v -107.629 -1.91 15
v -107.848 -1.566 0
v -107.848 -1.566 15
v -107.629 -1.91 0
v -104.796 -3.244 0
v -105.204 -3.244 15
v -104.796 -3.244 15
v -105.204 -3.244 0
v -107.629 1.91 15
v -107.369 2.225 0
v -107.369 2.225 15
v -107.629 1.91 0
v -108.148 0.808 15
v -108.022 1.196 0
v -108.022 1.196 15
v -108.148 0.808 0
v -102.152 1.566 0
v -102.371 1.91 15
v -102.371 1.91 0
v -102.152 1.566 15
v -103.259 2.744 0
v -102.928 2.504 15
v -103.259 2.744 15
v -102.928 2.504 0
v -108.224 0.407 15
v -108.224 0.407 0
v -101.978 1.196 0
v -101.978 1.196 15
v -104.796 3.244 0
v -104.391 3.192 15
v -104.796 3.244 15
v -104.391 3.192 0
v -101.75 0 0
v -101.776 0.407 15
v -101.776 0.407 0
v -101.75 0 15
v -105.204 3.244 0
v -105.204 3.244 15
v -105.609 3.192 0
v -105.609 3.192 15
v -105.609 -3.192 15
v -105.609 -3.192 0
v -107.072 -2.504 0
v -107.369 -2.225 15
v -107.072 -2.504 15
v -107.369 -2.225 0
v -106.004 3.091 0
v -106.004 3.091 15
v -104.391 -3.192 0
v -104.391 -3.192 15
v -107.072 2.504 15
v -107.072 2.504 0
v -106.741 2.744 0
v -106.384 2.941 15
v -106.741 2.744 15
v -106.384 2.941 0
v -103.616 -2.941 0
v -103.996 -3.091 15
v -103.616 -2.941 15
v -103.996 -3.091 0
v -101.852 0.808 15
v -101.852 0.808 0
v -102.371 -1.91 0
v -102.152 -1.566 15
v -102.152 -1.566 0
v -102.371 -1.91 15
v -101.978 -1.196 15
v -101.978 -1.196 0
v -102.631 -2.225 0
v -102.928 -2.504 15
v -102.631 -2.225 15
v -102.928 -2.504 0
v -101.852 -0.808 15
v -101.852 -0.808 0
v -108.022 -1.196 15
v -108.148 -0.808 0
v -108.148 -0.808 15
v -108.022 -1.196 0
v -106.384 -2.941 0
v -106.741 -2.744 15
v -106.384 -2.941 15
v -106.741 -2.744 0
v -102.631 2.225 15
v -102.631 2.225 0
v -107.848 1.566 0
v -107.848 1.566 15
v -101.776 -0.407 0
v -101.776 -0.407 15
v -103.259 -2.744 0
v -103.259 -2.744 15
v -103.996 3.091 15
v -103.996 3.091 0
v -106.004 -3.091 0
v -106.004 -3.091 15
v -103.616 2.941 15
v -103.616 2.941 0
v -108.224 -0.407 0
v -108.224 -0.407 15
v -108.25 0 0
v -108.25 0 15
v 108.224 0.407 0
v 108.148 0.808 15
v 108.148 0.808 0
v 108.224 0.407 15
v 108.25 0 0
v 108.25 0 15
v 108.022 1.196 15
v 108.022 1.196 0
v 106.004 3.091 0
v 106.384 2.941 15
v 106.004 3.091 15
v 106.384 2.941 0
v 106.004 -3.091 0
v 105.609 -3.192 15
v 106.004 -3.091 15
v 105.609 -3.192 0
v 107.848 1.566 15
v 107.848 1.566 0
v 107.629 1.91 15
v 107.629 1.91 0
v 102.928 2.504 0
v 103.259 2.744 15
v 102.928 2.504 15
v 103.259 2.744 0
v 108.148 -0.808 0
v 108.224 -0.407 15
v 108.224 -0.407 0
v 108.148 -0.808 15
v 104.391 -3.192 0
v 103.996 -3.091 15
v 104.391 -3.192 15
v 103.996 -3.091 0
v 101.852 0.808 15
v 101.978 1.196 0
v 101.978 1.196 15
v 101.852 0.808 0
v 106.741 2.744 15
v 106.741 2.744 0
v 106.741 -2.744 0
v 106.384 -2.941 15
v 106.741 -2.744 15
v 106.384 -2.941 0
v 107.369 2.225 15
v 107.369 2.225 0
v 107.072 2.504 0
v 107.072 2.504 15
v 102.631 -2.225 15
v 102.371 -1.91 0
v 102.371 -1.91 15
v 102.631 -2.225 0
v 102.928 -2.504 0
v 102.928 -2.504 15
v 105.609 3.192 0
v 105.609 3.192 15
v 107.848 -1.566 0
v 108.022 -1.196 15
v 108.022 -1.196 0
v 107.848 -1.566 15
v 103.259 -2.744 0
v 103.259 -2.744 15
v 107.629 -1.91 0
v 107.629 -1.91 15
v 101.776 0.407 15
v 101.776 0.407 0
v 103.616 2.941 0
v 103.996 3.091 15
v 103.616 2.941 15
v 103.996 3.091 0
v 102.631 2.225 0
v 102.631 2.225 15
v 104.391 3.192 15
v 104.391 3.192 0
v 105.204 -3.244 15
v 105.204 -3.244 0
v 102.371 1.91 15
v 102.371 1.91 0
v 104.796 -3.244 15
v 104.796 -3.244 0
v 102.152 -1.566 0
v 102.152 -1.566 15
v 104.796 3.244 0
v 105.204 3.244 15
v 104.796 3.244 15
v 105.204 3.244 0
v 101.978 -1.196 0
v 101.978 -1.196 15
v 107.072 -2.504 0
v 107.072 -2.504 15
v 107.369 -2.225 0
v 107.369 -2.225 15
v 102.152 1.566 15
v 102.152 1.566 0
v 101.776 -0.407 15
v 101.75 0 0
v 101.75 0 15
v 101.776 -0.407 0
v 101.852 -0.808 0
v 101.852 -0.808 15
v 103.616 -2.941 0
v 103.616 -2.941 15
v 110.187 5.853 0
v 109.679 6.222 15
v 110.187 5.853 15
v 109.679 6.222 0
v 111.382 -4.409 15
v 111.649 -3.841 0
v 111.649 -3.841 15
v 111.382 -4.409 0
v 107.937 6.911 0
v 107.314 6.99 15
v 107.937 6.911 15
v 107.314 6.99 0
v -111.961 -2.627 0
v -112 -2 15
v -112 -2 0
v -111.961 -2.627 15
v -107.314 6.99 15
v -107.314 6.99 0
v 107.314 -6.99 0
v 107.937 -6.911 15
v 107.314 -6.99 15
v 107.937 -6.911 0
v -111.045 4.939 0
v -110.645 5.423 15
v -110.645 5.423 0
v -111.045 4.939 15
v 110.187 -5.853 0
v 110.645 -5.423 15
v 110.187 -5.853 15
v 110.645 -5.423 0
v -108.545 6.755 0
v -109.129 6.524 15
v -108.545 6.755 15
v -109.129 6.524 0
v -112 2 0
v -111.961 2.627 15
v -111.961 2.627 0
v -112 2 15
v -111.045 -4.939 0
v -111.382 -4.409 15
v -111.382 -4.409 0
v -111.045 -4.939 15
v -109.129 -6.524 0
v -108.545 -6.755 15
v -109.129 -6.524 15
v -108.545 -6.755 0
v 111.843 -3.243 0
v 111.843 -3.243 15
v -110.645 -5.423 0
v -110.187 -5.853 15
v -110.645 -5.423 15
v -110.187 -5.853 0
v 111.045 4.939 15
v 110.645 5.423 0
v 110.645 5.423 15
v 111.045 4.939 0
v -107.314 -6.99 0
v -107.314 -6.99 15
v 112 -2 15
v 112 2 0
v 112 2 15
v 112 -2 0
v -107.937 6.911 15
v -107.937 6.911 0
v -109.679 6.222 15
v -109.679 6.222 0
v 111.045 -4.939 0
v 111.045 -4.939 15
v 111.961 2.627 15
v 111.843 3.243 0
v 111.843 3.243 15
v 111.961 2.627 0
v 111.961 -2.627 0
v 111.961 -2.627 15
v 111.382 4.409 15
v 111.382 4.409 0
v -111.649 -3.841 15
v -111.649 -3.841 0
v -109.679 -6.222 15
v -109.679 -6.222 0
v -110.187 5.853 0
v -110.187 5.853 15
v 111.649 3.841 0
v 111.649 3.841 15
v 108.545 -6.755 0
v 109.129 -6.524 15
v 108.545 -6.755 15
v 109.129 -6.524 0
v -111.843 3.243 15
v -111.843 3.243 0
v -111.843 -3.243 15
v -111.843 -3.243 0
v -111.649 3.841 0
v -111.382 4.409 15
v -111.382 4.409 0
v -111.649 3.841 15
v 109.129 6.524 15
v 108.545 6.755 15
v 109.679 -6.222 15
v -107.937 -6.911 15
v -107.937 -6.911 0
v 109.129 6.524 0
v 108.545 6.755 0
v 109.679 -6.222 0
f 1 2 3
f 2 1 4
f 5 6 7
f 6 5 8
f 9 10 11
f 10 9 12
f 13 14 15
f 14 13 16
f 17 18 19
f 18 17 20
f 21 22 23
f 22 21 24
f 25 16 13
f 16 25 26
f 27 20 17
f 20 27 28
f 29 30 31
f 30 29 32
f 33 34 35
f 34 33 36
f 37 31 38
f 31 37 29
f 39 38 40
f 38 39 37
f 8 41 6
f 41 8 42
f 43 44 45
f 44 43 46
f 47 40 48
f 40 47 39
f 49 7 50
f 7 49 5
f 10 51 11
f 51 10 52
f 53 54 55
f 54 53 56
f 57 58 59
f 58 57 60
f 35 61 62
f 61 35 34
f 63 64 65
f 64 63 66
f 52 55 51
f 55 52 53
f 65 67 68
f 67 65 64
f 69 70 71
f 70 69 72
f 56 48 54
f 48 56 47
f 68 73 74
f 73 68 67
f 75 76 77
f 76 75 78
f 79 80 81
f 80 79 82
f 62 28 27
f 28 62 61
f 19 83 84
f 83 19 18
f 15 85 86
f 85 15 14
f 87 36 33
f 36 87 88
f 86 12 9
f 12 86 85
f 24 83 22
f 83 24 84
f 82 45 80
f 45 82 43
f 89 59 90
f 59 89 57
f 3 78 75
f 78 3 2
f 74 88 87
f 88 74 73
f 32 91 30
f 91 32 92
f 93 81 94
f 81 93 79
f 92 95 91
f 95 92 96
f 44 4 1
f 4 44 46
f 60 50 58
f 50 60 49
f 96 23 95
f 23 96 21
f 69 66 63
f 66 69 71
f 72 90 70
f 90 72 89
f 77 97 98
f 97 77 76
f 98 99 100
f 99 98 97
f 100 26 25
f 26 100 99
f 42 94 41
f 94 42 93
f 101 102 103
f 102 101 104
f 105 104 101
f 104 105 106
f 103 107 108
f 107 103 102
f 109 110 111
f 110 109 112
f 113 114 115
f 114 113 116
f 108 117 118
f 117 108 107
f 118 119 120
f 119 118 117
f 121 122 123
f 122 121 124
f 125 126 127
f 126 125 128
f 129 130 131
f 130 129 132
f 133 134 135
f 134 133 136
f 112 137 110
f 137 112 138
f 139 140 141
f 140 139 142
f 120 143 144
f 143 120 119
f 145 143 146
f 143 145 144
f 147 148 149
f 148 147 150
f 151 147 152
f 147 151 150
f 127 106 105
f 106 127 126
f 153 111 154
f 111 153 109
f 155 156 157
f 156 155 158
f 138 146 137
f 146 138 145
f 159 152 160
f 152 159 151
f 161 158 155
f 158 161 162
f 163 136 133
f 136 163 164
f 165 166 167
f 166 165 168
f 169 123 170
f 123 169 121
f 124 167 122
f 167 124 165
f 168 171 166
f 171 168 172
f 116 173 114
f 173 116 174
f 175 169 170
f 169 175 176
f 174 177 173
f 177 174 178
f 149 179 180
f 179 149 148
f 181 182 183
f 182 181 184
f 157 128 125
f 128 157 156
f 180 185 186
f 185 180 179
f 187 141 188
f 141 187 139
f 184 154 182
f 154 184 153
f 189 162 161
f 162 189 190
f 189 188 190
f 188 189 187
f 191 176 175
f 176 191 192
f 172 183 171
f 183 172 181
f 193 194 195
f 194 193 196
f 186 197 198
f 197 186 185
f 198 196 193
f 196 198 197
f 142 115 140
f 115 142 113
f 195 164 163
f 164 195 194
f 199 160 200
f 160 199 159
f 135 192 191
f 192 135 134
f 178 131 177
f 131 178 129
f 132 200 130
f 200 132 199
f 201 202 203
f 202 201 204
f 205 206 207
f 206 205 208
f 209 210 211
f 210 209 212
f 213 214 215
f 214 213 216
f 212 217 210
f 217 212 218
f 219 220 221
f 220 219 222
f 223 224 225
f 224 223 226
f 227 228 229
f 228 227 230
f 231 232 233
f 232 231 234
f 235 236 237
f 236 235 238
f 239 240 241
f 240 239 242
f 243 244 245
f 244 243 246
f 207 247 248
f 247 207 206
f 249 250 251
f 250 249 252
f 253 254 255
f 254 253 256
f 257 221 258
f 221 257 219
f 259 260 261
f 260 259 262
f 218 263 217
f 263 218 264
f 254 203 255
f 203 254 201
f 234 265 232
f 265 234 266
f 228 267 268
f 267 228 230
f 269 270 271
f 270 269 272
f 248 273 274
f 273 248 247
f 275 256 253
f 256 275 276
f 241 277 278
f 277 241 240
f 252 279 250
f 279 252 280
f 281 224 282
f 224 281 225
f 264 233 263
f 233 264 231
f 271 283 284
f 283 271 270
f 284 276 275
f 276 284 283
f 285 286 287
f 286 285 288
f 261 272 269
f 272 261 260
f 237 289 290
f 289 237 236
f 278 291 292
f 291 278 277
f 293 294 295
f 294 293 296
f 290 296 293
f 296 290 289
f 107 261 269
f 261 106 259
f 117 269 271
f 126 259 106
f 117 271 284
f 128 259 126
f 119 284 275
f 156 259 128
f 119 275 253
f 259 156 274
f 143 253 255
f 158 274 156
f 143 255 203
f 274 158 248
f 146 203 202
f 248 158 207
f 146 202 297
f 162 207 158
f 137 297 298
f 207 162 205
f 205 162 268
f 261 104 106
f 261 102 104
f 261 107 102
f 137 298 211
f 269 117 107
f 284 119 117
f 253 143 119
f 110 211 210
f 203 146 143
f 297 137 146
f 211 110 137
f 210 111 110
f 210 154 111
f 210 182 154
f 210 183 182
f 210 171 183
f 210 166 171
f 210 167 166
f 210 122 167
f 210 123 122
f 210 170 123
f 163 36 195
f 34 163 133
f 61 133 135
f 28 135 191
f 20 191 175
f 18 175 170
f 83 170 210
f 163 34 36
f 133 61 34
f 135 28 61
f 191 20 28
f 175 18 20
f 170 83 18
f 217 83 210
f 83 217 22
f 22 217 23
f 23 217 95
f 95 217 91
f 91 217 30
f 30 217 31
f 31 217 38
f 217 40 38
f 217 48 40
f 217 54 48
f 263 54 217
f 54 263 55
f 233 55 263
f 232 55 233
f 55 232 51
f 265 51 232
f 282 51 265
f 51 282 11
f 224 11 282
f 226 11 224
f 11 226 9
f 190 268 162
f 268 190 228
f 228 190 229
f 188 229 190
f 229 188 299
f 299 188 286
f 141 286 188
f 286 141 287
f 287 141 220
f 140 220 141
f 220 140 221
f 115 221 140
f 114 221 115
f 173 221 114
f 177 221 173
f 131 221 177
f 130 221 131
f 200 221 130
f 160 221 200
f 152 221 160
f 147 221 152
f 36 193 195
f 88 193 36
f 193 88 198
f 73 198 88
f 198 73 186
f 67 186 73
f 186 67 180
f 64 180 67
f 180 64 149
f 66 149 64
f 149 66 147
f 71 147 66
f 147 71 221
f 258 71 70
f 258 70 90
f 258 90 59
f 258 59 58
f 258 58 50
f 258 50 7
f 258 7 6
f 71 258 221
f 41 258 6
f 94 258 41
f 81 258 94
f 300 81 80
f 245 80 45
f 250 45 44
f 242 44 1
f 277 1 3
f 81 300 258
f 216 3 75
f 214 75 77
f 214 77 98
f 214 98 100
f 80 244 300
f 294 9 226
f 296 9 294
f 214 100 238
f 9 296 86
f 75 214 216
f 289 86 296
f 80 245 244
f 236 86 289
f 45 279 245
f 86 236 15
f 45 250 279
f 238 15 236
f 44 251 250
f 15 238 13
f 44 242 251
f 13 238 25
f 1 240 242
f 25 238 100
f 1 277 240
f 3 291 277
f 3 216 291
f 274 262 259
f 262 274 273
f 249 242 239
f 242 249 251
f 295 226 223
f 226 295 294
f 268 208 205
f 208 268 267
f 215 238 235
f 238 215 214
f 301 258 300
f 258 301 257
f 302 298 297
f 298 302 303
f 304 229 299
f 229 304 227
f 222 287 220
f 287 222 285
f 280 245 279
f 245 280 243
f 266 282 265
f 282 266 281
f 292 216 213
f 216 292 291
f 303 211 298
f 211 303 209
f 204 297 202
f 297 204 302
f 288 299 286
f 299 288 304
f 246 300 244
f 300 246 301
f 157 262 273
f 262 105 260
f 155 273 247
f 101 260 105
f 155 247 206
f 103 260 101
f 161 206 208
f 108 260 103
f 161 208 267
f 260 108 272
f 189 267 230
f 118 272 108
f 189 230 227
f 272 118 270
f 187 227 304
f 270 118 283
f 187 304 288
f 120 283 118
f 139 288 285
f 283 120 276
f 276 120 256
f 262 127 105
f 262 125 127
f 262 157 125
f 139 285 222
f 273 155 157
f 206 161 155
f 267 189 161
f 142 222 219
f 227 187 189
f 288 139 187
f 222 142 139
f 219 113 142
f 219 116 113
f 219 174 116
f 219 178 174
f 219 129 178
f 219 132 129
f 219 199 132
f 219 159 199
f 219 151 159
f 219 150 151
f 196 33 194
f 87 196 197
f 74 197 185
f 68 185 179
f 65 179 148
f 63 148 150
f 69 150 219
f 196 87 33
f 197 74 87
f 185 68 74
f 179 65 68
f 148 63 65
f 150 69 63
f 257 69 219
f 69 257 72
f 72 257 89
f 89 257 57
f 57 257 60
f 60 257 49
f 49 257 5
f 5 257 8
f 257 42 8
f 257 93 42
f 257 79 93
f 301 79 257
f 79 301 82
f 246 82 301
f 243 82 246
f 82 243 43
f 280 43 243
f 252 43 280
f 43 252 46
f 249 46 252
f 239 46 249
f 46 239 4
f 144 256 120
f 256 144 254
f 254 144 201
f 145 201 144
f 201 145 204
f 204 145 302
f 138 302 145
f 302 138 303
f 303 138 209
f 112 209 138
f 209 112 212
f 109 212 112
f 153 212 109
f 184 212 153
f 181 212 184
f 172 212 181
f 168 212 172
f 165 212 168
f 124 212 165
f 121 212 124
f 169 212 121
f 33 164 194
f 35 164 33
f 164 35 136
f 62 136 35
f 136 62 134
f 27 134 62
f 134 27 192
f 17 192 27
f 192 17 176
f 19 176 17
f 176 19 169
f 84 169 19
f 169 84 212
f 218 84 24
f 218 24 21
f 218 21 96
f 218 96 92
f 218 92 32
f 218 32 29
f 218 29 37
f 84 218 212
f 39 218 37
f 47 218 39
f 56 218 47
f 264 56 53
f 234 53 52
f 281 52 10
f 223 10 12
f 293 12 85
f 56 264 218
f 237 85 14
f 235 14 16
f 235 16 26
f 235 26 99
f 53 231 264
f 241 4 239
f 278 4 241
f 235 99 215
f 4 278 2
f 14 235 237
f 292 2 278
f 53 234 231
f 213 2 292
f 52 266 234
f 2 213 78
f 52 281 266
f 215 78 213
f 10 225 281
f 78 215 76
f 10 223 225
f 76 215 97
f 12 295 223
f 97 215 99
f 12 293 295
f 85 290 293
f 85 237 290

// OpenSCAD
$fn = 50;


difference() {
	union() {
		hull() {
			translate(v = [-107.0000000000, 2.0000000000, 0]) {
				cylinder(h = 15, r = 5);
			}
			translate(v = [107.0000000000, 2.0000000000, 0]) {
				cylinder(h = 15, r = 5);
			}
			translate(v = [-107.0000000000, -2.0000000000, 0]) {
				cylinder(h = 15, r = 5);
			}
			translate(v = [107.0000000000, -2.0000000000, 0]) {
				cylinder(h = 15, r = 5);
			}
		}
	}
	union() {
		translate(v = [-105.0000000000, 0.0000000000, -100.0000000000]) {
			cylinder(h = 200, r = 3.2500000000);
		}
		translate(v = [-105.0000000000, 0.0000000000, -100.0000000000]) {
			cylinder(h = 200, r = 3.2500000000);
		}
		translate(v = [105.0000000000, 0.0000000000, -100.0000000000]) {
			cylinder(h = 200, r = 3.2500000000);
		}
		translate(v = [105.0000000000, 0.0000000000, -100.0000000000]) {
			cylinder(h = 200, r = 3.2500000000);
		}
	}
}
